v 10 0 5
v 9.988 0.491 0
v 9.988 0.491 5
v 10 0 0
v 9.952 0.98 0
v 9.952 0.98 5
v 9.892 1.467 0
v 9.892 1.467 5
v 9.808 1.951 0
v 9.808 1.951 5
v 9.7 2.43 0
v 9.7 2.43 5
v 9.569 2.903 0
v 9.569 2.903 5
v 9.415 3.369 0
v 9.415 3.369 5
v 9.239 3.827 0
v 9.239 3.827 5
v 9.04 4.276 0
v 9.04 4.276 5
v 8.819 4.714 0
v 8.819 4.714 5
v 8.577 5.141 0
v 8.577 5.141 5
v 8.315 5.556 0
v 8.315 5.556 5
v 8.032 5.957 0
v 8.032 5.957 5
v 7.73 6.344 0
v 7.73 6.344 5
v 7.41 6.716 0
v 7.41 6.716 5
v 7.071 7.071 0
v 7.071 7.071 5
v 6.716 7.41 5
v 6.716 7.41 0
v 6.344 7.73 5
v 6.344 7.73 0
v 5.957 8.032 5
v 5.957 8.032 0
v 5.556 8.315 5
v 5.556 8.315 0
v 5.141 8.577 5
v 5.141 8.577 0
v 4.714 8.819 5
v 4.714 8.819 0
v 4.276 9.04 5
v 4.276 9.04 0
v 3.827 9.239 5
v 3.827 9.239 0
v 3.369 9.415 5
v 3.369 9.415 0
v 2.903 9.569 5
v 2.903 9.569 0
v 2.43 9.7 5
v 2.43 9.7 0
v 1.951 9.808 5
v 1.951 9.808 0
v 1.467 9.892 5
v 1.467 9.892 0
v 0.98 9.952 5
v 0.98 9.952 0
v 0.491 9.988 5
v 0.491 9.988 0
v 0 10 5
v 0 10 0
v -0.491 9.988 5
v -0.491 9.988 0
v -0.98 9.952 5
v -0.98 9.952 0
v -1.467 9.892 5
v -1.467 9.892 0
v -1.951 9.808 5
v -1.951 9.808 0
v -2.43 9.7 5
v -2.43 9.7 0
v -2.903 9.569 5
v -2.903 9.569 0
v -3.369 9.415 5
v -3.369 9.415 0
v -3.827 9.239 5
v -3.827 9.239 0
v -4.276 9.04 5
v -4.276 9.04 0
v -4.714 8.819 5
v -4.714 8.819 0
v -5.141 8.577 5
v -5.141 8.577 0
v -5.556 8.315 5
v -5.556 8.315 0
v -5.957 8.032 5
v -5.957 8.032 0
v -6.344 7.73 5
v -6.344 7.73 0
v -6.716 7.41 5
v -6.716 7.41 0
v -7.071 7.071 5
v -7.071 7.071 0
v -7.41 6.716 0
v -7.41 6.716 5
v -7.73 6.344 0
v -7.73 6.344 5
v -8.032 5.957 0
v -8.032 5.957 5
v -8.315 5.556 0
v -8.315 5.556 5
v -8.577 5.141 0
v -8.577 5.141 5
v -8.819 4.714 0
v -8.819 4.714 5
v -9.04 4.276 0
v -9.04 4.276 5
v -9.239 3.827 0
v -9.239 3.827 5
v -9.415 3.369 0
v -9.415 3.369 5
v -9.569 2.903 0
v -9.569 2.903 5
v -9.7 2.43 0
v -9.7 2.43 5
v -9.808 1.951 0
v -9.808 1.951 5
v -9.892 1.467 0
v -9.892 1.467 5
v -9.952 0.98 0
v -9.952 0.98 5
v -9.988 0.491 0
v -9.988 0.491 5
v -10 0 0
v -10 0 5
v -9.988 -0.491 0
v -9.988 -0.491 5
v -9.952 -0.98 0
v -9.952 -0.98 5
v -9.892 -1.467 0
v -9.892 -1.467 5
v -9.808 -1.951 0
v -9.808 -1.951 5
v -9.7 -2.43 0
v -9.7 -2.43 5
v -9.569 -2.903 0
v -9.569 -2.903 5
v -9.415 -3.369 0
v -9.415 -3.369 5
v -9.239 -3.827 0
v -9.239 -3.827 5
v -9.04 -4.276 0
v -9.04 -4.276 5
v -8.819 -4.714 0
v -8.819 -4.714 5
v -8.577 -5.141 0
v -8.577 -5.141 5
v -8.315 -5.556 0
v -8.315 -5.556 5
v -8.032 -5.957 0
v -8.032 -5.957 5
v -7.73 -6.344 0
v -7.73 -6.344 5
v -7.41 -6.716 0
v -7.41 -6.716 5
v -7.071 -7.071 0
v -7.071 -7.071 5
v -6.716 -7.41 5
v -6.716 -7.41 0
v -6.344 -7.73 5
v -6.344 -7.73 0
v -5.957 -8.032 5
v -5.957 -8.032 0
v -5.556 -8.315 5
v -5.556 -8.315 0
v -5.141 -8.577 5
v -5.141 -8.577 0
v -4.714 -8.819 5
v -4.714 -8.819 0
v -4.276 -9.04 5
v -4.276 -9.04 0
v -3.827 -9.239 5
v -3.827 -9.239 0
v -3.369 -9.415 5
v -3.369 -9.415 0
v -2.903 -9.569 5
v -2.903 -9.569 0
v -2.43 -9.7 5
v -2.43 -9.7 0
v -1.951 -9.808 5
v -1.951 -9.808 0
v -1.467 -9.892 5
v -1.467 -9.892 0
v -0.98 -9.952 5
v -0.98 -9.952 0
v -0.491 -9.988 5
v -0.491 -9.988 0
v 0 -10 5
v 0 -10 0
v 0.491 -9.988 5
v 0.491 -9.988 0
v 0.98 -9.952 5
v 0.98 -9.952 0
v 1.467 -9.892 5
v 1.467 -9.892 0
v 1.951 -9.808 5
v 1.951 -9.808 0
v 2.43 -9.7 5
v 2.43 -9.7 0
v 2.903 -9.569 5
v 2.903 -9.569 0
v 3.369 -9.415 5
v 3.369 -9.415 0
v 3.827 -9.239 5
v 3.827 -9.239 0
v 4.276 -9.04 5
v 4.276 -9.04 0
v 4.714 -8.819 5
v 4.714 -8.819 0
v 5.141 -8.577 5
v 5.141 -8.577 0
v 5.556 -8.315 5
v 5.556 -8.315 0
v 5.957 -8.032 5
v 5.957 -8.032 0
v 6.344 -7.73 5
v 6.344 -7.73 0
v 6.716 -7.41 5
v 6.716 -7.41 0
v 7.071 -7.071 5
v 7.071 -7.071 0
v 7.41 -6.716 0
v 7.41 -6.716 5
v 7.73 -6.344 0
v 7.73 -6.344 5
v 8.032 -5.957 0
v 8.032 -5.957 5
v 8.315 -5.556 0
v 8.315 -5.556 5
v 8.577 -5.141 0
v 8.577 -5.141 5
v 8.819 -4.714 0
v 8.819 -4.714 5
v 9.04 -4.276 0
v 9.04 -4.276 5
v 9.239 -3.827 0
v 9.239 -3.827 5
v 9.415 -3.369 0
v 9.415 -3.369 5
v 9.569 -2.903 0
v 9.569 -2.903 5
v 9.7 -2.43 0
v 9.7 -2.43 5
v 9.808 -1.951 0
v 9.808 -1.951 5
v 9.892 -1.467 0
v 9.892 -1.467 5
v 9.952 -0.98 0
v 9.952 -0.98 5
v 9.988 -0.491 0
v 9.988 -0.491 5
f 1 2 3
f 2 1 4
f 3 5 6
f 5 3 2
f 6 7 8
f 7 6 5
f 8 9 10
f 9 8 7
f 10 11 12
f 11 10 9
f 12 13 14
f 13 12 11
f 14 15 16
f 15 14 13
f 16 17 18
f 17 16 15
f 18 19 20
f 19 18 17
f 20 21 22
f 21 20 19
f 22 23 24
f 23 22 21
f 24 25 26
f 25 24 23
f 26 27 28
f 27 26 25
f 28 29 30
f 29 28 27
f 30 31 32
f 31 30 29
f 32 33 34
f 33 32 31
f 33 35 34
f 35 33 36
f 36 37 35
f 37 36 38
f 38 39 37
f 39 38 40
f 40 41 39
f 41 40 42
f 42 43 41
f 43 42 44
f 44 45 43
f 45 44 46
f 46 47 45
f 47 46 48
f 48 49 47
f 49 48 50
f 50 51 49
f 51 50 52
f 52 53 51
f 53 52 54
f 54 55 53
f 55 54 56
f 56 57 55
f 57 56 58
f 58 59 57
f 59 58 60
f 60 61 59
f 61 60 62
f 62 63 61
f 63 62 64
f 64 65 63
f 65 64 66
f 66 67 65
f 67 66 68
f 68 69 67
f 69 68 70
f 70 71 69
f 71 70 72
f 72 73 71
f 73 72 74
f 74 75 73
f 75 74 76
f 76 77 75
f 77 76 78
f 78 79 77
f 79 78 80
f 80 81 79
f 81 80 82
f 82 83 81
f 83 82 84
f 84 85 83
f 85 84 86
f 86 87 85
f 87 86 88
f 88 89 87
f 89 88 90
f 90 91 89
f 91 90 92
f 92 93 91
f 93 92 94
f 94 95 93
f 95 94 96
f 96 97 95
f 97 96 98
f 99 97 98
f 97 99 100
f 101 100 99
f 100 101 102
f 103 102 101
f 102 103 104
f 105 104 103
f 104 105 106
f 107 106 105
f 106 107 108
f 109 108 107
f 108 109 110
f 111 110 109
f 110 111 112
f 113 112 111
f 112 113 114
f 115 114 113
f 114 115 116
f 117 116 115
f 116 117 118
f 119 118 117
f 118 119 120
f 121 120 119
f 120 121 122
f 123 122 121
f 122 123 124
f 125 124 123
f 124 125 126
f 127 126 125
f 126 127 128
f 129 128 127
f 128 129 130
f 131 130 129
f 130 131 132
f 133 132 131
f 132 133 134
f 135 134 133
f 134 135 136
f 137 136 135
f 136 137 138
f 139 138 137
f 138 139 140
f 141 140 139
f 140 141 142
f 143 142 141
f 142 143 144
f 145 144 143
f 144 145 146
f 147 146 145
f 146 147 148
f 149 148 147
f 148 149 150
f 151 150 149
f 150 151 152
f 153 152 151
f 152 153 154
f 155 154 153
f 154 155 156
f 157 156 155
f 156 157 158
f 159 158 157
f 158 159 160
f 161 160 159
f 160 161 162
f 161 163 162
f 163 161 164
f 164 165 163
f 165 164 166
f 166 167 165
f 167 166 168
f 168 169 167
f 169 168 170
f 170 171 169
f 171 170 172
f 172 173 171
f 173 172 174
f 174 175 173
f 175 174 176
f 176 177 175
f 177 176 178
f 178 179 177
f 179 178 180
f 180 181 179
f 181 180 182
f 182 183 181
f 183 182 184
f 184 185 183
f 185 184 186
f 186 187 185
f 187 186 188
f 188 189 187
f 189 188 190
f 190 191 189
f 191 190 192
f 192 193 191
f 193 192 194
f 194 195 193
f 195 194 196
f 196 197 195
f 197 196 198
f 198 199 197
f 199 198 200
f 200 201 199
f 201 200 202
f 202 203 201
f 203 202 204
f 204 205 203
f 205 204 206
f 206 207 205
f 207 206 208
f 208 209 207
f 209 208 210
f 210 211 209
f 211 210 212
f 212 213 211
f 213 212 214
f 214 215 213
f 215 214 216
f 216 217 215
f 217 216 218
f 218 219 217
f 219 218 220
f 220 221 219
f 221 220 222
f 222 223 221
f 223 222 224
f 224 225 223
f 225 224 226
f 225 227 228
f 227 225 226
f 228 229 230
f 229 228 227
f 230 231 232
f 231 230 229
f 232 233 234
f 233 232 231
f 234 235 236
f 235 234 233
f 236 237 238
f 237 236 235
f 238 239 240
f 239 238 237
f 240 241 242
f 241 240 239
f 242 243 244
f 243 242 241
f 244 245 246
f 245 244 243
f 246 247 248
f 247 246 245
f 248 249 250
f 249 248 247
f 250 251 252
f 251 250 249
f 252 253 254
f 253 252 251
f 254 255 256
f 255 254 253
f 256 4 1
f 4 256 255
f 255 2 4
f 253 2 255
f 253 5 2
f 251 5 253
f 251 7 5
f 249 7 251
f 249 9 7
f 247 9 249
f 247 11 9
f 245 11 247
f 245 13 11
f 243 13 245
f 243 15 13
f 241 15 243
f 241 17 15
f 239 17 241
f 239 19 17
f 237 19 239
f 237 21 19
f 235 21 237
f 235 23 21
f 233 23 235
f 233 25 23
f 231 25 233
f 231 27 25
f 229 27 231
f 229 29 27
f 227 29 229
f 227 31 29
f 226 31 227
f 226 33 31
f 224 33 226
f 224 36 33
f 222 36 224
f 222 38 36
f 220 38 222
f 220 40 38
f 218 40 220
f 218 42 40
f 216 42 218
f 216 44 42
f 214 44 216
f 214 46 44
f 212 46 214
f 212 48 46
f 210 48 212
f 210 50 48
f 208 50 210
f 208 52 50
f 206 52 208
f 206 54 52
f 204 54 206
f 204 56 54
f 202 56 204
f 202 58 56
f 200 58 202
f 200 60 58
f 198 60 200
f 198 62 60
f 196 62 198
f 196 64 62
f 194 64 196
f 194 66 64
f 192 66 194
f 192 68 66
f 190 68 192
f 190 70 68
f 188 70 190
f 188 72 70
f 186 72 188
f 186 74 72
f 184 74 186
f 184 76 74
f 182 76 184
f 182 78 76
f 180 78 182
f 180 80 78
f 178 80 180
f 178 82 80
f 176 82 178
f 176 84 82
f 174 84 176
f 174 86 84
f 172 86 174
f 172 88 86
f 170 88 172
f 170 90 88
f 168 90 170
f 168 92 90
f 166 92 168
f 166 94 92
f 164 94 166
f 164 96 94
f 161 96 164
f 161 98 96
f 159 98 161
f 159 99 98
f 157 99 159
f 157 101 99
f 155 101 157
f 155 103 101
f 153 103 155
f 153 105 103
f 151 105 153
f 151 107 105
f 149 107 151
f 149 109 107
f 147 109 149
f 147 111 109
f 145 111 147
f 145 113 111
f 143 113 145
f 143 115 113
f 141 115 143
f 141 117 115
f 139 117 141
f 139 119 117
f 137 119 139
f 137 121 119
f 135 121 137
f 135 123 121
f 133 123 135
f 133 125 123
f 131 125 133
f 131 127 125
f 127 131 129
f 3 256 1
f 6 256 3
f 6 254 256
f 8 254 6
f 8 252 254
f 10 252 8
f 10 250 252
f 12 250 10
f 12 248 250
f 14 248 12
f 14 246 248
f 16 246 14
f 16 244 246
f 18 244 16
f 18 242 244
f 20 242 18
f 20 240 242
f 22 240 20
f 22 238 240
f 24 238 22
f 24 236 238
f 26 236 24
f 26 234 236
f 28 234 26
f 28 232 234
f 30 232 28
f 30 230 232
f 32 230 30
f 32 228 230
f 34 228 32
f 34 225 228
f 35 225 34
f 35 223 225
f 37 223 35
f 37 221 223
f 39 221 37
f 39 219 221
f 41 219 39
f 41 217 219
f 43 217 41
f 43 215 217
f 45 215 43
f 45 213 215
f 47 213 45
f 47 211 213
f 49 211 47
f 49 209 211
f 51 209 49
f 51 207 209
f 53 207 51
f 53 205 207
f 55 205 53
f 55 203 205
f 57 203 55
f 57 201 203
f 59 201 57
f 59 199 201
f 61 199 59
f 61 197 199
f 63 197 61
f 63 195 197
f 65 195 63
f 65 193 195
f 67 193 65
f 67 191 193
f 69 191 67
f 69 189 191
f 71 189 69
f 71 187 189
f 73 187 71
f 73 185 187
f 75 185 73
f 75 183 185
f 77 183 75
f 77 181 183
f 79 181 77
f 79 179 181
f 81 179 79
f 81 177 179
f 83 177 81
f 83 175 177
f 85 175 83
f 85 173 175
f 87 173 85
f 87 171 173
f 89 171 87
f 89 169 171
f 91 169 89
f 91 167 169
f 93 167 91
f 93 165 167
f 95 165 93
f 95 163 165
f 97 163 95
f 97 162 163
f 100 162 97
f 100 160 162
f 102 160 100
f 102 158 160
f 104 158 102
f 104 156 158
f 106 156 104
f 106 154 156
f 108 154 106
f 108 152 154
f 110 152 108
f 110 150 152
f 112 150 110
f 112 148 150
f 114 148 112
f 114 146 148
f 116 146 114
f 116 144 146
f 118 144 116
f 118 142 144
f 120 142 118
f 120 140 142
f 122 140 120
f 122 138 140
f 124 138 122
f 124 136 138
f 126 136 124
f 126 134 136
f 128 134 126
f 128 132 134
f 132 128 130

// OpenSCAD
$fn = 128;

magnet_d = 20;
magnet_h = 5;

cylinder(d = magnet_d, h = magnet_h);
